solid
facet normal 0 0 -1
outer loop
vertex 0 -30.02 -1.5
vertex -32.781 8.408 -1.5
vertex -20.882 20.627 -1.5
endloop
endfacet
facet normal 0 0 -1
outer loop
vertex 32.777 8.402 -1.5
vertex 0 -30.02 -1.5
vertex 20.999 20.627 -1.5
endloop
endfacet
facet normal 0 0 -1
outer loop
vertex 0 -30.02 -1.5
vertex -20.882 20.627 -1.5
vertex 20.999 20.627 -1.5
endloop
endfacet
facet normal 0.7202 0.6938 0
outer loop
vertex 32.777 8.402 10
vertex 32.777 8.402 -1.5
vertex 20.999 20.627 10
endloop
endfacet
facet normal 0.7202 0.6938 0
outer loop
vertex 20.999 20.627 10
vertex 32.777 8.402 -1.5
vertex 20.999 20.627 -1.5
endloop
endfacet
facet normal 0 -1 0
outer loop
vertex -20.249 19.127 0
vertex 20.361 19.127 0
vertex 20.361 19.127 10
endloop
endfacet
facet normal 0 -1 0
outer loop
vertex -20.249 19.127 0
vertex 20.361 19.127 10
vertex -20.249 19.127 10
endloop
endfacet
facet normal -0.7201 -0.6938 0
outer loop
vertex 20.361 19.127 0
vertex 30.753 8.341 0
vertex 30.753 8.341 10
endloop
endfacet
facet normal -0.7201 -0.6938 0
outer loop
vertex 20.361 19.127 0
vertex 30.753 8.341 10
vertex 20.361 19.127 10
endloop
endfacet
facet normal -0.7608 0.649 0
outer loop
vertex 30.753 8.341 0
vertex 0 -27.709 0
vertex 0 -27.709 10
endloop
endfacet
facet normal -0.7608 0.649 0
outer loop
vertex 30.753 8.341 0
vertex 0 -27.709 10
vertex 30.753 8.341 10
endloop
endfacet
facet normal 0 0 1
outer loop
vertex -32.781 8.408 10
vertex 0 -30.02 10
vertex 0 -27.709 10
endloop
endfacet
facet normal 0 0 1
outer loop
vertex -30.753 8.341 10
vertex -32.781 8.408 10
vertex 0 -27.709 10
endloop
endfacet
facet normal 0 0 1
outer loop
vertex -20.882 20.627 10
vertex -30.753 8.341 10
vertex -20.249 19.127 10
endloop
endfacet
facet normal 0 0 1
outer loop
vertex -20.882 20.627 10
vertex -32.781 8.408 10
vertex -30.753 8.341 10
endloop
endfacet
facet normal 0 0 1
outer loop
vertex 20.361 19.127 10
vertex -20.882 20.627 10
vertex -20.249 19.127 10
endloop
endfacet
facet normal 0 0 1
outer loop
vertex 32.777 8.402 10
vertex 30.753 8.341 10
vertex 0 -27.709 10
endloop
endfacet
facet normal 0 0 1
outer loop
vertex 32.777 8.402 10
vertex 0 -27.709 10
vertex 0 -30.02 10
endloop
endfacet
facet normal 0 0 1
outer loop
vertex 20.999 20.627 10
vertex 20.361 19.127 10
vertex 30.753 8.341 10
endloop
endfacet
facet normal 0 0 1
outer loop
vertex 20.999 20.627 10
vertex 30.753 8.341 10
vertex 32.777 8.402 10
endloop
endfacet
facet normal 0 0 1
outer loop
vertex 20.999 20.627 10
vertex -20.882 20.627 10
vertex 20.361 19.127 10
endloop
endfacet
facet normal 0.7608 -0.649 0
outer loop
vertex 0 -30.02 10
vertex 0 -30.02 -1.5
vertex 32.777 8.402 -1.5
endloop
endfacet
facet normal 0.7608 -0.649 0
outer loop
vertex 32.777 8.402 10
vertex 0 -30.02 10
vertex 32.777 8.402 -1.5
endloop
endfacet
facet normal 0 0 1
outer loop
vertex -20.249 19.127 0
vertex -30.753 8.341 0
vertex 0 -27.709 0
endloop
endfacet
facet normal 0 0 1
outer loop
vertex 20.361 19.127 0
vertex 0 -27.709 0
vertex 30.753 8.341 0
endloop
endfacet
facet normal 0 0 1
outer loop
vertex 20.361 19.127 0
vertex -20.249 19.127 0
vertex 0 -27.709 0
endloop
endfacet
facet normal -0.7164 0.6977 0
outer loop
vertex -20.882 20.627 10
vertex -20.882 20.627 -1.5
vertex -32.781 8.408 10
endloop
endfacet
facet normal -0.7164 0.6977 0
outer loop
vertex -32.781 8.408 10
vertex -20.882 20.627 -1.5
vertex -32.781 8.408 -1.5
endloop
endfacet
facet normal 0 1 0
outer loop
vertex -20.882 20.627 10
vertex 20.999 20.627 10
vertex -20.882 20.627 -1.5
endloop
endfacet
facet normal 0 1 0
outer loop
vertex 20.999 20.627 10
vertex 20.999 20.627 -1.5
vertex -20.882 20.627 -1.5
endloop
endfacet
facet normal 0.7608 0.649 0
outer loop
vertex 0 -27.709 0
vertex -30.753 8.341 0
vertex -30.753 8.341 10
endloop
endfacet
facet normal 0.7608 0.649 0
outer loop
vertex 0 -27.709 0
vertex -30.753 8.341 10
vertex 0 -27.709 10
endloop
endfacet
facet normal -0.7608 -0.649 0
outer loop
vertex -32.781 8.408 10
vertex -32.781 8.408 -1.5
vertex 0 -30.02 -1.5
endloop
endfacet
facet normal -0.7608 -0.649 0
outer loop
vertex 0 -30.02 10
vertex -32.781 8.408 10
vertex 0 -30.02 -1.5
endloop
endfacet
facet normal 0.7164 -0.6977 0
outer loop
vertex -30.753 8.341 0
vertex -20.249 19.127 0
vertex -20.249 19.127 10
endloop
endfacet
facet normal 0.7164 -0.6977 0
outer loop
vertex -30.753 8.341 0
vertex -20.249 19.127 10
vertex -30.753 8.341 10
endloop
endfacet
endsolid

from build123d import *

# Parameters (mm, degrees)
F1_DEPTH = 10
F2_DEPTH = 10
F3_T     = 1.5
F4_R     = 5.8821297936
F5_DEPTH = 25.4


with BuildPart() as f1:
    # F0 (on Top) → F1 (new body)
    with BuildSketch(Plane.XY):
        Polygon((0, 16.2254609168), (-19.0141089261, 16.2254609168), (-26.4055486768, 8.4195453674), (0, -22.3205629736), (26.4055486768, 8.4195453674), (19.0141089261, 16.2254609168), align=None)
    extrude(amount=F1_DEPTH)

    # F0 (on Top) → F2 (join)
    with BuildSketch(Plane.XY):
        Polygon((-19.0141089261, 16.2254609168), (-20.2486366034, 19.1267747432), (-30.752800405, 8.3410236984), (-26.4055486768, 8.4195453674), align=None)
        Polygon((20.3608628362, 19.1267747432), (-20.2486366034, 19.1267747432), (-19.0141089261, 16.2254609168), (0, 16.2254609168), (19.0141089261, 16.2254609168), align=None)
        Polygon((30.752800405, 8.3410236984), (20.3608628362, 19.1267747432), (19.0141089261, 16.2254609168), (26.4055486768, 8.4195453674), align=None)
        Polygon((0, -27.7087166905), (30.752800405, 8.3410236984), (26.4055486768, 8.4195453674), (0, -22.3205629736), align=None)
        Polygon((-26.4055486768, 8.4195453674), (-30.752800405, 8.3410236984), (0, -27.7087166905), (0, -22.3205629736), align=None)
    extrude(amount=F2_DEPTH)

    # F3
    f3_openings = [f1.faces().sort_by_distance(p)[0] for p in [
        (0.008676, 1.980184, 10),
    ]]
    offset(amount=F3_T, openings=f3_openings, kind=Kind.INTERSECTION)

    # F4 (on face) → F5 (cut)
    with BuildSketch(Plane(origin=(0, 0, -1.5), x_dir=(1, 0, 0), z_dir=(0, 0, -1))):
        Circle(F4_R)
    extrude(amount=F5_DEPTH, mode=Mode.SUBTRACT)


solid = f1.part
